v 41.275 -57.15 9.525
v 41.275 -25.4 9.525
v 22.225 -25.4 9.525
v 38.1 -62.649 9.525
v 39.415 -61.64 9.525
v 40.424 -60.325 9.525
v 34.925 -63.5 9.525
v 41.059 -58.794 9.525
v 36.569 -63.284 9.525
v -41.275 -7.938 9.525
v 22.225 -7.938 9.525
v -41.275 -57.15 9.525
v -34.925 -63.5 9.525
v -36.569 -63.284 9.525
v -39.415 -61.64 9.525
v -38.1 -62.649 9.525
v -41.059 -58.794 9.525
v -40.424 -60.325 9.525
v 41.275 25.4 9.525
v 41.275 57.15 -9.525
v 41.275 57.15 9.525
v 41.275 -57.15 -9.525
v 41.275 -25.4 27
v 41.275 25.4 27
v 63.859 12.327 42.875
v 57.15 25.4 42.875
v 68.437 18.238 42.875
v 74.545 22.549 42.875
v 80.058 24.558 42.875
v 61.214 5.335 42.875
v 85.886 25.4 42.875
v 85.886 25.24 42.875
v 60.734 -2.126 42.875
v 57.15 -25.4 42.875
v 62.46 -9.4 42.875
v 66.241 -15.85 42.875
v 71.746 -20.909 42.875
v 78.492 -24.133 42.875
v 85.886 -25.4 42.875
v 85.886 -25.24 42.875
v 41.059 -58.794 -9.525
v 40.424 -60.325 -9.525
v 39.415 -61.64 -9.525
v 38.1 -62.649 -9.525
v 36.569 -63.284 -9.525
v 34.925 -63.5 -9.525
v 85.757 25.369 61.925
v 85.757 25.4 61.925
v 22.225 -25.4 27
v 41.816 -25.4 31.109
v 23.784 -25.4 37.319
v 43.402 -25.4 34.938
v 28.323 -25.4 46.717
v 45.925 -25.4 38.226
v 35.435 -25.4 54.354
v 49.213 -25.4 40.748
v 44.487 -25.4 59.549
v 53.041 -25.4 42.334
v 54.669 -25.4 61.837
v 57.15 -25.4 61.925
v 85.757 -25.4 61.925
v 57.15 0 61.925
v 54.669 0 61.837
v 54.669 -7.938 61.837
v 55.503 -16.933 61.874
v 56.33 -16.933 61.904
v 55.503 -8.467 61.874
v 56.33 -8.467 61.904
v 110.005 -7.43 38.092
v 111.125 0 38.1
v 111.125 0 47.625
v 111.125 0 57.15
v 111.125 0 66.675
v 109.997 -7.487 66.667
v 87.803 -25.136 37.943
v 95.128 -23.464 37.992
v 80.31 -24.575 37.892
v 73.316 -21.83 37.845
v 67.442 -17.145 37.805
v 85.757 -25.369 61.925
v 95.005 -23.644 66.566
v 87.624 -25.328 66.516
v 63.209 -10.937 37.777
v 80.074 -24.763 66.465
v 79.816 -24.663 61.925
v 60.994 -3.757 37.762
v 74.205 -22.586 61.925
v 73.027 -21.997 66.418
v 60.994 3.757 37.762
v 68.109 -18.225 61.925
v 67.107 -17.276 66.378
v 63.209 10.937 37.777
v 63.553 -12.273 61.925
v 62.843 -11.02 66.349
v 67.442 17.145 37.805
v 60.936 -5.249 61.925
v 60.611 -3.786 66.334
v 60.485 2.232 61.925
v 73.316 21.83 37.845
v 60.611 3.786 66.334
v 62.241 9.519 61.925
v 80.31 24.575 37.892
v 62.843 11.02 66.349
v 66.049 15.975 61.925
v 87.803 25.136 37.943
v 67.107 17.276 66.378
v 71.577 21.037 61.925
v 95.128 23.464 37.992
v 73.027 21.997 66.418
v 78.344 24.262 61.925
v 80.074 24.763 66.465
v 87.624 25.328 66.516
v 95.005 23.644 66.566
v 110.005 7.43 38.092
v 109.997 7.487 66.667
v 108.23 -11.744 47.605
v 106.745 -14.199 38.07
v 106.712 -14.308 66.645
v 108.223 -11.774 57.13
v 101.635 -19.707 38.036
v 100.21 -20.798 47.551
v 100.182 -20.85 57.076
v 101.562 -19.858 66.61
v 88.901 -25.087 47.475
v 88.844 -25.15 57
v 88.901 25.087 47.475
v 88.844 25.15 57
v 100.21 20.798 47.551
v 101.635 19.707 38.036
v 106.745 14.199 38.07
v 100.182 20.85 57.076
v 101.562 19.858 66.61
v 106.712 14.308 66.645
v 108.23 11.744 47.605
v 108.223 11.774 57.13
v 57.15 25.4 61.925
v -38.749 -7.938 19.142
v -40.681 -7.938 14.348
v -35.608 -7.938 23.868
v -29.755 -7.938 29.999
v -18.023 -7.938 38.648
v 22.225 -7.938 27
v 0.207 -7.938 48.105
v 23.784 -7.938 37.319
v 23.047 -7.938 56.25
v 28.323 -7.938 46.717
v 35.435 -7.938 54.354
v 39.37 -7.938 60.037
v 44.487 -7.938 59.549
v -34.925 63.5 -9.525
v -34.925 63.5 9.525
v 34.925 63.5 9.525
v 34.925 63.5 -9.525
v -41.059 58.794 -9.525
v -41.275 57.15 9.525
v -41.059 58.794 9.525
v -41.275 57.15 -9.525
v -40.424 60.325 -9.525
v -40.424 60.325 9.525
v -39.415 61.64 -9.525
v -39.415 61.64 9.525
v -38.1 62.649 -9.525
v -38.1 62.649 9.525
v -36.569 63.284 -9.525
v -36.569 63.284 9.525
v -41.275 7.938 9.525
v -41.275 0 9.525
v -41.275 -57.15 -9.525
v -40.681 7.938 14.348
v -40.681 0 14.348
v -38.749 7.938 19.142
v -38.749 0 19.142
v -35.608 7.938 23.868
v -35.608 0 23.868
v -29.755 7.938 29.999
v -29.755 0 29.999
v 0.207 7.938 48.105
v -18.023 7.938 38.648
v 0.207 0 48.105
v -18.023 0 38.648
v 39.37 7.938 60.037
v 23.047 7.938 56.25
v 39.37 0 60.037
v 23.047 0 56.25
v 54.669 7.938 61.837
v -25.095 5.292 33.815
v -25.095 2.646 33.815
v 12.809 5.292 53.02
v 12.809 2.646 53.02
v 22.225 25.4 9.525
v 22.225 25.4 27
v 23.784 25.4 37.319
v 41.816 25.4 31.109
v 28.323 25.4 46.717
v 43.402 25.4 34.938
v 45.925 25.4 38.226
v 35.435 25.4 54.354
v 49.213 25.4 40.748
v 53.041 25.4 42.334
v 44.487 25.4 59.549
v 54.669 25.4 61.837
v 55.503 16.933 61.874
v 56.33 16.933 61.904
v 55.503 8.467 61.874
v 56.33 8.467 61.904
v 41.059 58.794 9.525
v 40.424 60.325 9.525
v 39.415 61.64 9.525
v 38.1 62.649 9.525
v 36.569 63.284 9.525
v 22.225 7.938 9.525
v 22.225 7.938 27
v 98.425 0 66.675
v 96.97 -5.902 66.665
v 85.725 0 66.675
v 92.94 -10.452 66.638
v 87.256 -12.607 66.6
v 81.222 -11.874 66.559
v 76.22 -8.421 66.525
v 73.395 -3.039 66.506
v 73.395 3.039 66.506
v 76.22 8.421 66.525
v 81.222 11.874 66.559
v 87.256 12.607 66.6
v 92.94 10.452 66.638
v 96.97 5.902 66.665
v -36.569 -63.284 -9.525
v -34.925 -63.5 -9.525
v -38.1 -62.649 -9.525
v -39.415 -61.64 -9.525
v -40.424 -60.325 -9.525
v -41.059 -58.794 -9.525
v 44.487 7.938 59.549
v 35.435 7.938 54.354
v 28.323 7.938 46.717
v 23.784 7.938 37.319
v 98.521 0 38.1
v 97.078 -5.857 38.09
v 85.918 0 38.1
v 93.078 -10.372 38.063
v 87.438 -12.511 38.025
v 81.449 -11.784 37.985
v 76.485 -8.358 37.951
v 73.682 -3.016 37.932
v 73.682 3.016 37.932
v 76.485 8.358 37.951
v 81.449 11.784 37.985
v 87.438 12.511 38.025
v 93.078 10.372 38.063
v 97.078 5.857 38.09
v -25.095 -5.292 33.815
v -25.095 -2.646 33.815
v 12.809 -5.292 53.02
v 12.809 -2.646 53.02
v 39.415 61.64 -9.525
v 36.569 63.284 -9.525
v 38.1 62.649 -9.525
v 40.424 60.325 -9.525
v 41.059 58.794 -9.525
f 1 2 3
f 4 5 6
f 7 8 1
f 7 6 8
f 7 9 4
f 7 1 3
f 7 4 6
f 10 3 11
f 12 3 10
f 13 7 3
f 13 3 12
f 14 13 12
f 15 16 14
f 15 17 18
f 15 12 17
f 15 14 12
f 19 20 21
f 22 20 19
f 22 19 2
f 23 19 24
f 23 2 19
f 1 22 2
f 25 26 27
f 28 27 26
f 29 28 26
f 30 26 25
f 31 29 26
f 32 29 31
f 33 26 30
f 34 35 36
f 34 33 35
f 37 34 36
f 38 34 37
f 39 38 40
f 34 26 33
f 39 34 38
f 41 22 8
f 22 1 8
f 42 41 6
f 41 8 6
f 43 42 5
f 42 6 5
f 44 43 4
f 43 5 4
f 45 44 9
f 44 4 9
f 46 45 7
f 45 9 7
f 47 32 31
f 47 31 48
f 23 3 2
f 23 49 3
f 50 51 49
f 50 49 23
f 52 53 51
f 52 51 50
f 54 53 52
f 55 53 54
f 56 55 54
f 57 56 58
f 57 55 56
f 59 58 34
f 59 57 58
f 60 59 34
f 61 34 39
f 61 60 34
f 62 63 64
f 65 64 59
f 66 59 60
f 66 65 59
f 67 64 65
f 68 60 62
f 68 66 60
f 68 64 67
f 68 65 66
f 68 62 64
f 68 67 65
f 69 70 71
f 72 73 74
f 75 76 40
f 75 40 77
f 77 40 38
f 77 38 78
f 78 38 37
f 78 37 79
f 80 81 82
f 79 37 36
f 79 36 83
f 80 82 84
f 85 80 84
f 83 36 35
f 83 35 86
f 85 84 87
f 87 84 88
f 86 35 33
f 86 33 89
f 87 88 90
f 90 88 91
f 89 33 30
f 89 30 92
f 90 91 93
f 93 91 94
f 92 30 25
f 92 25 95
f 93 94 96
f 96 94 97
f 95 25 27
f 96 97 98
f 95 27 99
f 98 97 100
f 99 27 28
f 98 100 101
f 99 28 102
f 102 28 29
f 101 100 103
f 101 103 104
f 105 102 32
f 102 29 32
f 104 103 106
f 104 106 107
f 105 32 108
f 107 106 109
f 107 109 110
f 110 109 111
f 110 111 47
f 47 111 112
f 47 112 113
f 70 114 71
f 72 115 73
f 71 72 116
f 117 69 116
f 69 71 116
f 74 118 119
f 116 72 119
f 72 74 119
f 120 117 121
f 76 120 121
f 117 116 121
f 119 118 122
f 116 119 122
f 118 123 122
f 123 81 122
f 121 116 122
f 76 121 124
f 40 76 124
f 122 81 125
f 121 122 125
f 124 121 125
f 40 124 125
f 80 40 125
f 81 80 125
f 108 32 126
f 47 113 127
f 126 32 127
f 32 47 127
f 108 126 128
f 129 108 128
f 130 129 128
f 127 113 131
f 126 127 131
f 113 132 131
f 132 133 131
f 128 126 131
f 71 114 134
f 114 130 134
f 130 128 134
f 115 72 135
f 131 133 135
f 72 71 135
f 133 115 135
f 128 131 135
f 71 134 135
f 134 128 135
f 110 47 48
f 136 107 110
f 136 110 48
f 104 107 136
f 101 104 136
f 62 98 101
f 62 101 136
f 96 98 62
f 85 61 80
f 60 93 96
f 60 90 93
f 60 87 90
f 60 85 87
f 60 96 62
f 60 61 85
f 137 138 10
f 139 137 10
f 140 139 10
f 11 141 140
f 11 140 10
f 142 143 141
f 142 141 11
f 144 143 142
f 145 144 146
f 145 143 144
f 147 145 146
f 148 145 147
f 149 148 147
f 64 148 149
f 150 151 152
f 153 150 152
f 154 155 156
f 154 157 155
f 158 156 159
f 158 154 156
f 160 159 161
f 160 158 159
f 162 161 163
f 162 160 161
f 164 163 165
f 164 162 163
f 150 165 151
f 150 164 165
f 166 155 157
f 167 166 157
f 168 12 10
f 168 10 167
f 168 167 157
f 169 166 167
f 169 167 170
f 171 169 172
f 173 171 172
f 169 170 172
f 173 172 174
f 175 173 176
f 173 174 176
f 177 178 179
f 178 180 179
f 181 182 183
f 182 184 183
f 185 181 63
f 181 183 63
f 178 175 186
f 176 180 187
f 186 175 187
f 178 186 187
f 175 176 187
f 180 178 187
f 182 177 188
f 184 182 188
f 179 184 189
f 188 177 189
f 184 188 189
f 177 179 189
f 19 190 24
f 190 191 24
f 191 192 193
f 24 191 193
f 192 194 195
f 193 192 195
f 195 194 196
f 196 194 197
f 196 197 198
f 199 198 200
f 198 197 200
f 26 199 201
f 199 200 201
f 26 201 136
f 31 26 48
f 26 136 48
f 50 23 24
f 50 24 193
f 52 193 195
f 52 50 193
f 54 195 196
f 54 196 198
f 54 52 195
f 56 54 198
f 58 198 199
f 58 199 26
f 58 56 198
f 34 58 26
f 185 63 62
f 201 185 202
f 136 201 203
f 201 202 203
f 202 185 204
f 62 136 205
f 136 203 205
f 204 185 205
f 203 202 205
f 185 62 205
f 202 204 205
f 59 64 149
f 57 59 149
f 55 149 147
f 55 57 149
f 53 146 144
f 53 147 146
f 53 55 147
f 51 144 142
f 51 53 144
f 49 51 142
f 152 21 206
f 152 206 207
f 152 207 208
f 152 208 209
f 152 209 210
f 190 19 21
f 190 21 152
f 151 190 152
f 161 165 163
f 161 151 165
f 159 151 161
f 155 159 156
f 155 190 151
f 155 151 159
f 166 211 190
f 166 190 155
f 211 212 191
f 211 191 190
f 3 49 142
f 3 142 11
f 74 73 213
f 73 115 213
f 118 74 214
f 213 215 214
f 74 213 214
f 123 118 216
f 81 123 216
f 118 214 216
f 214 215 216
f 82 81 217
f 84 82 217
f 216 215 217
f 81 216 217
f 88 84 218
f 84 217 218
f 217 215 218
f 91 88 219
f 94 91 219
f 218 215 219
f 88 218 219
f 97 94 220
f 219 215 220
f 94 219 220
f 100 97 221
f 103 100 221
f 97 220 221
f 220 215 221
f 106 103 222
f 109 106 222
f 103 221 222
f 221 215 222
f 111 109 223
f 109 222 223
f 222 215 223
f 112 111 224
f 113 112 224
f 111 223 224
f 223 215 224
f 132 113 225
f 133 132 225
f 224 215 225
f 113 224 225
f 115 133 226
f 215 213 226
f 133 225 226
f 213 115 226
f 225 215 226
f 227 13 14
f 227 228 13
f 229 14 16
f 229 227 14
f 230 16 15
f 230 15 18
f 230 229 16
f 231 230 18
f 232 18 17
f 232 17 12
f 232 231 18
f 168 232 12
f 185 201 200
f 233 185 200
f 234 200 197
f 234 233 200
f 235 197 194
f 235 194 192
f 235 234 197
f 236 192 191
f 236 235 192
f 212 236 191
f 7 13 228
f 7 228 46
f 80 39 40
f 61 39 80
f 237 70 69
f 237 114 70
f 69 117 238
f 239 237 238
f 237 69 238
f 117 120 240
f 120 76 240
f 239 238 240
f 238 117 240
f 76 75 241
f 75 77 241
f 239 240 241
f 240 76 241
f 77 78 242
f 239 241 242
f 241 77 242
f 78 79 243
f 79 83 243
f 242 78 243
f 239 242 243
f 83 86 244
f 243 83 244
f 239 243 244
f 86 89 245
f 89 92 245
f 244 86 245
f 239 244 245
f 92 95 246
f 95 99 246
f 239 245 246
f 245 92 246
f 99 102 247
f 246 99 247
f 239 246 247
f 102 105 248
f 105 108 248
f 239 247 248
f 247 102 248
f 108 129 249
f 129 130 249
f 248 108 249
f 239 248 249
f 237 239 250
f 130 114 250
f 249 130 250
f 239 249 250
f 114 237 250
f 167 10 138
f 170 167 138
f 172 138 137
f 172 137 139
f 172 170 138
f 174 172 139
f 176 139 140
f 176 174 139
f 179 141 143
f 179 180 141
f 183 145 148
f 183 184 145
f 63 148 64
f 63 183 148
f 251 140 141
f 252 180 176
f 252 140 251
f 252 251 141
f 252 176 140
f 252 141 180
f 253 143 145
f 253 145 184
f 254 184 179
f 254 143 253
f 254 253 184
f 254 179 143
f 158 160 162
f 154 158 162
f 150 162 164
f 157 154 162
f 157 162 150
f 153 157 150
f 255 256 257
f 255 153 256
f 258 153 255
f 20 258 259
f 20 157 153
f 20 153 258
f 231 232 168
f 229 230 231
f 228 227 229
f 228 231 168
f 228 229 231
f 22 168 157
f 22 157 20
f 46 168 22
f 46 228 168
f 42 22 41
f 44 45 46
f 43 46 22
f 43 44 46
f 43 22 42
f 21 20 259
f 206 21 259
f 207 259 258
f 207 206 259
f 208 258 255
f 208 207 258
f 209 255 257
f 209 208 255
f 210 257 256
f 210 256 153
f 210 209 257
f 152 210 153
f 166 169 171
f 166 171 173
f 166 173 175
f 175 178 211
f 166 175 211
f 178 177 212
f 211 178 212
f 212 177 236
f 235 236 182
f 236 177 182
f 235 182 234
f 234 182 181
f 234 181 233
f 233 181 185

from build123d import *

# Parameters (mm, degrees)
F1_DEPTH = 63.5
F2_DEPTH = 25.4
F3_DEPTH = 7.9375
F5_R     = 6.35


with BuildPart() as f1:
    # F0 (on Front) → F1 (new body, symmetric)
    with BuildSketch(Plane.XZ):
        Polygon((41.275, -9.525), (41.275, 9.525), (22.225, 9.525), (-41.275, 9.525), (-41.275, -9.525), align=None)
    extrude(amount=F1_DEPTH, both=True)

    # F0 (on Front) → F2 (join, symmetric)
    with BuildSketch(Plane.XZ):
        with BuildLine():
            Line((22.225, 9.525), (41.275, 9.525))
            Line((41.275, 9.525), (41.275, 27.0002))
            ThreePointArc((41.275, 27.0002), (45.9246798487, 38.2255201513), (57.15, 42.8752))
            Line((57.15, 42.8752), (60.325, 42.8752))
            Line((60.325, 42.8752), (60.325, 61.9252))
            Line((60.325, 61.9252), (57.15, 61.9252))
            add(Edge.make_bspline(
                [(54.6691726914, 61.8369782791), (55.5065067591, 61.8779502767), (56.3337362614, 61.9074431943), (57.15, 61.9252)],
                knots=[109.0952645489, 109.0952645489, 109.0952645489, 109.0952645489, 111.5045361635, 111.5045361635, 111.5045361635, 111.5045361635], degree=3))
            ThreePointArc((54.6691726914, 61.8369782791), (31.592236808, 50.8026445304), (22.225, 27.0002))
            Line((22.225, 27.0002), (22.225, 9.525))
        make_face()
        Polygon((60.325, 61.9252), (60.325, 42.8752), (85.8856061574, 42.8752), (85.7570526696, 61.9252), align=None)
    extrude(amount=F2_DEPTH, both=True)

    # F0 (on Front) → F3 (join, symmetric)
    with BuildSketch(Plane.XZ):
        with BuildLine():
            Line((-41.275, 9.525), (22.225, 9.525))
            Line((22.225, 9.525), (22.225, 27.0002))
            ThreePointArc((22.225, 27.0002), (31.592236808, 50.8026445304), (54.6691726914, 61.8369782791))
            add(Edge.make_bspline(
                [(-41.275, 9.525), (-41.8806763556, 34.5896402805), (16.7534885196, 59.9817076265), (54.6691726914, 61.8369782791)],
                knots=[0, 0, 0, 0, 109.0952645489, 109.0952645489, 109.0952645489, 109.0952645489], degree=3))
        make_face()
    extrude(amount=F3_DEPTH, both=True)

    # F0 (on Front) → F4 (revolve)
    with BuildSketch(Plane.XZ):
        Polygon((85.7570526696, 61.9252), (85.8856061574, 42.8752), (85.9178302317, 38.1), (111.125, 38.1), (111.125, 66.675), (85.725, 66.675), align=None)
    revolve(axis=Axis((85.8214151158, 0, 52.3875), (0.0067480609, 0, -0.9999772316)))

    # F5
    f5_edges = [f1.edges().sort_by_distance(p)[0] for p in [
        (41.275, -63.5, 0),
        (-41.275, -63.5, 0),
        (-41.275, 63.5, 0),
        (41.275, 63.5, 0),
    ]]
    fillet(f5_edges, radius=F5_R)


solid = f1.part
